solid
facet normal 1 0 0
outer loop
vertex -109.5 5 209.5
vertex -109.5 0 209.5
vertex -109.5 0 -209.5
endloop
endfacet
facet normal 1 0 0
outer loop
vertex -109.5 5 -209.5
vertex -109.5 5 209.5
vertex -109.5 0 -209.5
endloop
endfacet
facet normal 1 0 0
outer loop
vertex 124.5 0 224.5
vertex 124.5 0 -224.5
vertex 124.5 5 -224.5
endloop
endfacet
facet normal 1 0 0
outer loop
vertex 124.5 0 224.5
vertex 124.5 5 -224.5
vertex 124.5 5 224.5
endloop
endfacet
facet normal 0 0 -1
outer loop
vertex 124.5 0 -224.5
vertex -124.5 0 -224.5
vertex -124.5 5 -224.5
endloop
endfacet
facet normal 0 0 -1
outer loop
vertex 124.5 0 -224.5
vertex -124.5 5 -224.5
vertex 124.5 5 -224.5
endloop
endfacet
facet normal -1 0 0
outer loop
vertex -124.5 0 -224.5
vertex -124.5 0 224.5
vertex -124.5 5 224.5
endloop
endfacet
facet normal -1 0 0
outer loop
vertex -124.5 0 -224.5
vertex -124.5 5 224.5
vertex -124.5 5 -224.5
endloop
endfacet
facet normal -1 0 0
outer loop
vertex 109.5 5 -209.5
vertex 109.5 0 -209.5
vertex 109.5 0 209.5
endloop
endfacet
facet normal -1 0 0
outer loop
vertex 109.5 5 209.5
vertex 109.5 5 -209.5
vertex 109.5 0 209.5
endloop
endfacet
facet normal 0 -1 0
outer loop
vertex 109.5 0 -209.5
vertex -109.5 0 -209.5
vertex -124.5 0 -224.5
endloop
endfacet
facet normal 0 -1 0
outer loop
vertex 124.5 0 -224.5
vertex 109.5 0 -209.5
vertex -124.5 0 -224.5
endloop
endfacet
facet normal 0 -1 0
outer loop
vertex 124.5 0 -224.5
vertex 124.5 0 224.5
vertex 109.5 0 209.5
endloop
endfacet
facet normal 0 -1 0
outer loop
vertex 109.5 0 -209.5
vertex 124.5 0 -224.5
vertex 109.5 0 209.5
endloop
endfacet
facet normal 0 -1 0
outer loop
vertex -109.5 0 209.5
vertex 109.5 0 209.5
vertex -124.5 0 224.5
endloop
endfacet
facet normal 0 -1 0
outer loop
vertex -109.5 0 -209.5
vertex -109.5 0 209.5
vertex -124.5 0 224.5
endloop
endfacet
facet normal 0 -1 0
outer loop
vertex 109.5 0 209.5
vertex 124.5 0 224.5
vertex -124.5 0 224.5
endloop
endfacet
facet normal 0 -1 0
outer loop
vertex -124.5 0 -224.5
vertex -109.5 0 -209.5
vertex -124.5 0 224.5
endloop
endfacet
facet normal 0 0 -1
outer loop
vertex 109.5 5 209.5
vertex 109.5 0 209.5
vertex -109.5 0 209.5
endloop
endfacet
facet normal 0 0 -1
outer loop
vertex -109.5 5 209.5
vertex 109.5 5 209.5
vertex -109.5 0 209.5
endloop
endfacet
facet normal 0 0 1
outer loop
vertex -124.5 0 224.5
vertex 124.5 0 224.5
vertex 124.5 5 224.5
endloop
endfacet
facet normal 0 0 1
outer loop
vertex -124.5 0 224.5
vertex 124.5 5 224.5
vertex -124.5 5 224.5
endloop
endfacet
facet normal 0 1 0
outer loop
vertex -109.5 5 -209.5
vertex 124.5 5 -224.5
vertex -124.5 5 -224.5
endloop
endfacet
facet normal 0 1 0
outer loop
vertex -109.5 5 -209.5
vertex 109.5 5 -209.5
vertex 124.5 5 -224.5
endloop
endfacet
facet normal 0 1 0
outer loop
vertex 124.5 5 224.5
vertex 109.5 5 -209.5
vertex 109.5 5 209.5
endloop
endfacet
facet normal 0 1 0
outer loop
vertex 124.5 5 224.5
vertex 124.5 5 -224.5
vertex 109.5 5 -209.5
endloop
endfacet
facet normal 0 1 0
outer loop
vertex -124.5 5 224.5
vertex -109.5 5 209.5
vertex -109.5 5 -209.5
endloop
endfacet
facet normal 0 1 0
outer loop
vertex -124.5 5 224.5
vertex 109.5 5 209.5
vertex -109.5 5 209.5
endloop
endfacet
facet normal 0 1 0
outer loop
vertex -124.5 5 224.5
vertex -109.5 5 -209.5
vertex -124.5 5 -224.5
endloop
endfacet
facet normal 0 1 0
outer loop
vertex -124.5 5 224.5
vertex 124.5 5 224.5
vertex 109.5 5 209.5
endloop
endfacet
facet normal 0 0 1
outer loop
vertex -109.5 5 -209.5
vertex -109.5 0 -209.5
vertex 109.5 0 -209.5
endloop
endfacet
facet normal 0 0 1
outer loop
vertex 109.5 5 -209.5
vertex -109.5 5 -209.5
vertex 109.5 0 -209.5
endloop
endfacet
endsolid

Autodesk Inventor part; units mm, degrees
ref_plane "YZ Plane" through (0, 0, 0) normal (1, 0, 0) x (0, 1, 0)
ref_plane "XZ Plane" through (0, 0, 0) normal (0, 1, 0) x (-1, 0, 0)
ref_plane "XY Plane" through (0, 0, 0) normal (0, 0, 1) x (1, 0, 0)
sketch "Sketch1" plane through (0, 0, 0) normal (0, 1, 0) x (-1, 0, 0)
  line L0 (130, 230) -> (-130, 230)
  line L1 (-130, 230) -> (-130, -230)
  line L2 (-130, -230) -> (130, -230)
  line L3 (130, -230) -> (130, 230)
  line L4 (130, 230) -> (-130, -230) construction
  line L5 (-130, 230) -> (130, -230) construction
  line L6 (124.5, -224.5) -> (-124.5, -224.5)
  line L7 (-124.5, -224.5) -> (-124.5, 224.5)
  line L8 (-124.5, 224.5) -> (124.5, 224.5)
  line L9 (124.5, 224.5) -> (124.5, -224.5)
  line L10 (124.5, -224.5) -> (-124.5, 224.5) construction
  line L11 (-124.5, -224.5) -> (124.5, 224.5) construction
  line L12 (-109.5, 209.5) -> (109.5, 209.5)
  line L13 (109.5, 209.5) -> (109.5, -209.5)
  line L14 (109.5, -209.5) -> (-109.5, -209.5)
  line L15 (-109.5, -209.5) -> (-109.5, 209.5)
  line L16 (-109.5, 209.5) -> (109.5, -209.5) construction
  line L17 (109.5, 209.5) -> (-109.5, -209.5) construction
  point P0 (0, 0)
  dimension "d0" = 260
  dimension "d1" = 460
  dimension "d8" = 249
  dimension "d9" = 449
  dimension "d10" = 219
  dimension "d11" = 419
extrude "Extrusion3" add sketch "Sketch1" along normal blind 5 contours L6 L7 L8 L9
equation "\"d0\" = boxl + 2 * pvct"
equation "\"d1\" = boxw + 2 * pvct"
equation "\"d8\" = boxl - 2 * play"
equation "\"d9\" = boxw - 2 * play"
equation "\"d10\" = boxl - 2 * play - 2 * supporth"
equation "\"d11\" = boxw - 2 * play - 2 * supporth"
equation "\"d12\" = pvct"
equation "\"solhole\" = 3"
equation "\"solholespacing\" = 16"
equation "\"ssolw\" = 63"
equation "\"bsoll\" = 126"
equation "\"bsolw\" = 91"
equation "\"bsolh\" = 126"
equation "\"tapl\" = 31"
equation "\"tl\" = 32"
equation "\"eloboww\" = 25"
equation "\"pvct\" = 5"
equation "\"boxh\" = 258"
equation "\"supporth\" = 15"
equation "\"play\" = 0.5"
equation "\"arw\" = 54"
equation "\"arl\" = 102"
equation "\"psuh\" = 85"
equation "\"screenw\" = 197"
equation "\"screenl\" = 115"
equation "\"pcbw\" = 76"
equation "\"pcbl\" = 86"
equation "\"pcbh\" = 46"
equation "\"seph\" = 105"
equation "\"diaetape\" = 25"
equation "\"diaload\" = 16"
equation "\"diapower\" = 16"
equation "\"diaph\" = 32"
equation "\"distbubblewater\" = 82"
equation "\"distpumps\" = 75"
equation "\"waterouter\" = 39"
equation "\"waterinner\" = 28"
equation "\"pumpinner\" = 16"
equation "\"pumpouter\" = 25"
equation "\"airoutinner\" = 28"
equation "\"airoutouter\" = 39"
equation "\"airinouter\" = 39"
equation "\"airininner\" = 28"
equation "\"diapowerouter\" = 25"
equation "\"dialoadouter\" = 25"
equation "\"diaetapeouter\" = 36"
equation "\"diaphouter\" = 48"
equation "\"boxl\" = 250"
equation "\"boxw\" = 450"
properties part number "sb_bottom" material "PVC-Piping"
